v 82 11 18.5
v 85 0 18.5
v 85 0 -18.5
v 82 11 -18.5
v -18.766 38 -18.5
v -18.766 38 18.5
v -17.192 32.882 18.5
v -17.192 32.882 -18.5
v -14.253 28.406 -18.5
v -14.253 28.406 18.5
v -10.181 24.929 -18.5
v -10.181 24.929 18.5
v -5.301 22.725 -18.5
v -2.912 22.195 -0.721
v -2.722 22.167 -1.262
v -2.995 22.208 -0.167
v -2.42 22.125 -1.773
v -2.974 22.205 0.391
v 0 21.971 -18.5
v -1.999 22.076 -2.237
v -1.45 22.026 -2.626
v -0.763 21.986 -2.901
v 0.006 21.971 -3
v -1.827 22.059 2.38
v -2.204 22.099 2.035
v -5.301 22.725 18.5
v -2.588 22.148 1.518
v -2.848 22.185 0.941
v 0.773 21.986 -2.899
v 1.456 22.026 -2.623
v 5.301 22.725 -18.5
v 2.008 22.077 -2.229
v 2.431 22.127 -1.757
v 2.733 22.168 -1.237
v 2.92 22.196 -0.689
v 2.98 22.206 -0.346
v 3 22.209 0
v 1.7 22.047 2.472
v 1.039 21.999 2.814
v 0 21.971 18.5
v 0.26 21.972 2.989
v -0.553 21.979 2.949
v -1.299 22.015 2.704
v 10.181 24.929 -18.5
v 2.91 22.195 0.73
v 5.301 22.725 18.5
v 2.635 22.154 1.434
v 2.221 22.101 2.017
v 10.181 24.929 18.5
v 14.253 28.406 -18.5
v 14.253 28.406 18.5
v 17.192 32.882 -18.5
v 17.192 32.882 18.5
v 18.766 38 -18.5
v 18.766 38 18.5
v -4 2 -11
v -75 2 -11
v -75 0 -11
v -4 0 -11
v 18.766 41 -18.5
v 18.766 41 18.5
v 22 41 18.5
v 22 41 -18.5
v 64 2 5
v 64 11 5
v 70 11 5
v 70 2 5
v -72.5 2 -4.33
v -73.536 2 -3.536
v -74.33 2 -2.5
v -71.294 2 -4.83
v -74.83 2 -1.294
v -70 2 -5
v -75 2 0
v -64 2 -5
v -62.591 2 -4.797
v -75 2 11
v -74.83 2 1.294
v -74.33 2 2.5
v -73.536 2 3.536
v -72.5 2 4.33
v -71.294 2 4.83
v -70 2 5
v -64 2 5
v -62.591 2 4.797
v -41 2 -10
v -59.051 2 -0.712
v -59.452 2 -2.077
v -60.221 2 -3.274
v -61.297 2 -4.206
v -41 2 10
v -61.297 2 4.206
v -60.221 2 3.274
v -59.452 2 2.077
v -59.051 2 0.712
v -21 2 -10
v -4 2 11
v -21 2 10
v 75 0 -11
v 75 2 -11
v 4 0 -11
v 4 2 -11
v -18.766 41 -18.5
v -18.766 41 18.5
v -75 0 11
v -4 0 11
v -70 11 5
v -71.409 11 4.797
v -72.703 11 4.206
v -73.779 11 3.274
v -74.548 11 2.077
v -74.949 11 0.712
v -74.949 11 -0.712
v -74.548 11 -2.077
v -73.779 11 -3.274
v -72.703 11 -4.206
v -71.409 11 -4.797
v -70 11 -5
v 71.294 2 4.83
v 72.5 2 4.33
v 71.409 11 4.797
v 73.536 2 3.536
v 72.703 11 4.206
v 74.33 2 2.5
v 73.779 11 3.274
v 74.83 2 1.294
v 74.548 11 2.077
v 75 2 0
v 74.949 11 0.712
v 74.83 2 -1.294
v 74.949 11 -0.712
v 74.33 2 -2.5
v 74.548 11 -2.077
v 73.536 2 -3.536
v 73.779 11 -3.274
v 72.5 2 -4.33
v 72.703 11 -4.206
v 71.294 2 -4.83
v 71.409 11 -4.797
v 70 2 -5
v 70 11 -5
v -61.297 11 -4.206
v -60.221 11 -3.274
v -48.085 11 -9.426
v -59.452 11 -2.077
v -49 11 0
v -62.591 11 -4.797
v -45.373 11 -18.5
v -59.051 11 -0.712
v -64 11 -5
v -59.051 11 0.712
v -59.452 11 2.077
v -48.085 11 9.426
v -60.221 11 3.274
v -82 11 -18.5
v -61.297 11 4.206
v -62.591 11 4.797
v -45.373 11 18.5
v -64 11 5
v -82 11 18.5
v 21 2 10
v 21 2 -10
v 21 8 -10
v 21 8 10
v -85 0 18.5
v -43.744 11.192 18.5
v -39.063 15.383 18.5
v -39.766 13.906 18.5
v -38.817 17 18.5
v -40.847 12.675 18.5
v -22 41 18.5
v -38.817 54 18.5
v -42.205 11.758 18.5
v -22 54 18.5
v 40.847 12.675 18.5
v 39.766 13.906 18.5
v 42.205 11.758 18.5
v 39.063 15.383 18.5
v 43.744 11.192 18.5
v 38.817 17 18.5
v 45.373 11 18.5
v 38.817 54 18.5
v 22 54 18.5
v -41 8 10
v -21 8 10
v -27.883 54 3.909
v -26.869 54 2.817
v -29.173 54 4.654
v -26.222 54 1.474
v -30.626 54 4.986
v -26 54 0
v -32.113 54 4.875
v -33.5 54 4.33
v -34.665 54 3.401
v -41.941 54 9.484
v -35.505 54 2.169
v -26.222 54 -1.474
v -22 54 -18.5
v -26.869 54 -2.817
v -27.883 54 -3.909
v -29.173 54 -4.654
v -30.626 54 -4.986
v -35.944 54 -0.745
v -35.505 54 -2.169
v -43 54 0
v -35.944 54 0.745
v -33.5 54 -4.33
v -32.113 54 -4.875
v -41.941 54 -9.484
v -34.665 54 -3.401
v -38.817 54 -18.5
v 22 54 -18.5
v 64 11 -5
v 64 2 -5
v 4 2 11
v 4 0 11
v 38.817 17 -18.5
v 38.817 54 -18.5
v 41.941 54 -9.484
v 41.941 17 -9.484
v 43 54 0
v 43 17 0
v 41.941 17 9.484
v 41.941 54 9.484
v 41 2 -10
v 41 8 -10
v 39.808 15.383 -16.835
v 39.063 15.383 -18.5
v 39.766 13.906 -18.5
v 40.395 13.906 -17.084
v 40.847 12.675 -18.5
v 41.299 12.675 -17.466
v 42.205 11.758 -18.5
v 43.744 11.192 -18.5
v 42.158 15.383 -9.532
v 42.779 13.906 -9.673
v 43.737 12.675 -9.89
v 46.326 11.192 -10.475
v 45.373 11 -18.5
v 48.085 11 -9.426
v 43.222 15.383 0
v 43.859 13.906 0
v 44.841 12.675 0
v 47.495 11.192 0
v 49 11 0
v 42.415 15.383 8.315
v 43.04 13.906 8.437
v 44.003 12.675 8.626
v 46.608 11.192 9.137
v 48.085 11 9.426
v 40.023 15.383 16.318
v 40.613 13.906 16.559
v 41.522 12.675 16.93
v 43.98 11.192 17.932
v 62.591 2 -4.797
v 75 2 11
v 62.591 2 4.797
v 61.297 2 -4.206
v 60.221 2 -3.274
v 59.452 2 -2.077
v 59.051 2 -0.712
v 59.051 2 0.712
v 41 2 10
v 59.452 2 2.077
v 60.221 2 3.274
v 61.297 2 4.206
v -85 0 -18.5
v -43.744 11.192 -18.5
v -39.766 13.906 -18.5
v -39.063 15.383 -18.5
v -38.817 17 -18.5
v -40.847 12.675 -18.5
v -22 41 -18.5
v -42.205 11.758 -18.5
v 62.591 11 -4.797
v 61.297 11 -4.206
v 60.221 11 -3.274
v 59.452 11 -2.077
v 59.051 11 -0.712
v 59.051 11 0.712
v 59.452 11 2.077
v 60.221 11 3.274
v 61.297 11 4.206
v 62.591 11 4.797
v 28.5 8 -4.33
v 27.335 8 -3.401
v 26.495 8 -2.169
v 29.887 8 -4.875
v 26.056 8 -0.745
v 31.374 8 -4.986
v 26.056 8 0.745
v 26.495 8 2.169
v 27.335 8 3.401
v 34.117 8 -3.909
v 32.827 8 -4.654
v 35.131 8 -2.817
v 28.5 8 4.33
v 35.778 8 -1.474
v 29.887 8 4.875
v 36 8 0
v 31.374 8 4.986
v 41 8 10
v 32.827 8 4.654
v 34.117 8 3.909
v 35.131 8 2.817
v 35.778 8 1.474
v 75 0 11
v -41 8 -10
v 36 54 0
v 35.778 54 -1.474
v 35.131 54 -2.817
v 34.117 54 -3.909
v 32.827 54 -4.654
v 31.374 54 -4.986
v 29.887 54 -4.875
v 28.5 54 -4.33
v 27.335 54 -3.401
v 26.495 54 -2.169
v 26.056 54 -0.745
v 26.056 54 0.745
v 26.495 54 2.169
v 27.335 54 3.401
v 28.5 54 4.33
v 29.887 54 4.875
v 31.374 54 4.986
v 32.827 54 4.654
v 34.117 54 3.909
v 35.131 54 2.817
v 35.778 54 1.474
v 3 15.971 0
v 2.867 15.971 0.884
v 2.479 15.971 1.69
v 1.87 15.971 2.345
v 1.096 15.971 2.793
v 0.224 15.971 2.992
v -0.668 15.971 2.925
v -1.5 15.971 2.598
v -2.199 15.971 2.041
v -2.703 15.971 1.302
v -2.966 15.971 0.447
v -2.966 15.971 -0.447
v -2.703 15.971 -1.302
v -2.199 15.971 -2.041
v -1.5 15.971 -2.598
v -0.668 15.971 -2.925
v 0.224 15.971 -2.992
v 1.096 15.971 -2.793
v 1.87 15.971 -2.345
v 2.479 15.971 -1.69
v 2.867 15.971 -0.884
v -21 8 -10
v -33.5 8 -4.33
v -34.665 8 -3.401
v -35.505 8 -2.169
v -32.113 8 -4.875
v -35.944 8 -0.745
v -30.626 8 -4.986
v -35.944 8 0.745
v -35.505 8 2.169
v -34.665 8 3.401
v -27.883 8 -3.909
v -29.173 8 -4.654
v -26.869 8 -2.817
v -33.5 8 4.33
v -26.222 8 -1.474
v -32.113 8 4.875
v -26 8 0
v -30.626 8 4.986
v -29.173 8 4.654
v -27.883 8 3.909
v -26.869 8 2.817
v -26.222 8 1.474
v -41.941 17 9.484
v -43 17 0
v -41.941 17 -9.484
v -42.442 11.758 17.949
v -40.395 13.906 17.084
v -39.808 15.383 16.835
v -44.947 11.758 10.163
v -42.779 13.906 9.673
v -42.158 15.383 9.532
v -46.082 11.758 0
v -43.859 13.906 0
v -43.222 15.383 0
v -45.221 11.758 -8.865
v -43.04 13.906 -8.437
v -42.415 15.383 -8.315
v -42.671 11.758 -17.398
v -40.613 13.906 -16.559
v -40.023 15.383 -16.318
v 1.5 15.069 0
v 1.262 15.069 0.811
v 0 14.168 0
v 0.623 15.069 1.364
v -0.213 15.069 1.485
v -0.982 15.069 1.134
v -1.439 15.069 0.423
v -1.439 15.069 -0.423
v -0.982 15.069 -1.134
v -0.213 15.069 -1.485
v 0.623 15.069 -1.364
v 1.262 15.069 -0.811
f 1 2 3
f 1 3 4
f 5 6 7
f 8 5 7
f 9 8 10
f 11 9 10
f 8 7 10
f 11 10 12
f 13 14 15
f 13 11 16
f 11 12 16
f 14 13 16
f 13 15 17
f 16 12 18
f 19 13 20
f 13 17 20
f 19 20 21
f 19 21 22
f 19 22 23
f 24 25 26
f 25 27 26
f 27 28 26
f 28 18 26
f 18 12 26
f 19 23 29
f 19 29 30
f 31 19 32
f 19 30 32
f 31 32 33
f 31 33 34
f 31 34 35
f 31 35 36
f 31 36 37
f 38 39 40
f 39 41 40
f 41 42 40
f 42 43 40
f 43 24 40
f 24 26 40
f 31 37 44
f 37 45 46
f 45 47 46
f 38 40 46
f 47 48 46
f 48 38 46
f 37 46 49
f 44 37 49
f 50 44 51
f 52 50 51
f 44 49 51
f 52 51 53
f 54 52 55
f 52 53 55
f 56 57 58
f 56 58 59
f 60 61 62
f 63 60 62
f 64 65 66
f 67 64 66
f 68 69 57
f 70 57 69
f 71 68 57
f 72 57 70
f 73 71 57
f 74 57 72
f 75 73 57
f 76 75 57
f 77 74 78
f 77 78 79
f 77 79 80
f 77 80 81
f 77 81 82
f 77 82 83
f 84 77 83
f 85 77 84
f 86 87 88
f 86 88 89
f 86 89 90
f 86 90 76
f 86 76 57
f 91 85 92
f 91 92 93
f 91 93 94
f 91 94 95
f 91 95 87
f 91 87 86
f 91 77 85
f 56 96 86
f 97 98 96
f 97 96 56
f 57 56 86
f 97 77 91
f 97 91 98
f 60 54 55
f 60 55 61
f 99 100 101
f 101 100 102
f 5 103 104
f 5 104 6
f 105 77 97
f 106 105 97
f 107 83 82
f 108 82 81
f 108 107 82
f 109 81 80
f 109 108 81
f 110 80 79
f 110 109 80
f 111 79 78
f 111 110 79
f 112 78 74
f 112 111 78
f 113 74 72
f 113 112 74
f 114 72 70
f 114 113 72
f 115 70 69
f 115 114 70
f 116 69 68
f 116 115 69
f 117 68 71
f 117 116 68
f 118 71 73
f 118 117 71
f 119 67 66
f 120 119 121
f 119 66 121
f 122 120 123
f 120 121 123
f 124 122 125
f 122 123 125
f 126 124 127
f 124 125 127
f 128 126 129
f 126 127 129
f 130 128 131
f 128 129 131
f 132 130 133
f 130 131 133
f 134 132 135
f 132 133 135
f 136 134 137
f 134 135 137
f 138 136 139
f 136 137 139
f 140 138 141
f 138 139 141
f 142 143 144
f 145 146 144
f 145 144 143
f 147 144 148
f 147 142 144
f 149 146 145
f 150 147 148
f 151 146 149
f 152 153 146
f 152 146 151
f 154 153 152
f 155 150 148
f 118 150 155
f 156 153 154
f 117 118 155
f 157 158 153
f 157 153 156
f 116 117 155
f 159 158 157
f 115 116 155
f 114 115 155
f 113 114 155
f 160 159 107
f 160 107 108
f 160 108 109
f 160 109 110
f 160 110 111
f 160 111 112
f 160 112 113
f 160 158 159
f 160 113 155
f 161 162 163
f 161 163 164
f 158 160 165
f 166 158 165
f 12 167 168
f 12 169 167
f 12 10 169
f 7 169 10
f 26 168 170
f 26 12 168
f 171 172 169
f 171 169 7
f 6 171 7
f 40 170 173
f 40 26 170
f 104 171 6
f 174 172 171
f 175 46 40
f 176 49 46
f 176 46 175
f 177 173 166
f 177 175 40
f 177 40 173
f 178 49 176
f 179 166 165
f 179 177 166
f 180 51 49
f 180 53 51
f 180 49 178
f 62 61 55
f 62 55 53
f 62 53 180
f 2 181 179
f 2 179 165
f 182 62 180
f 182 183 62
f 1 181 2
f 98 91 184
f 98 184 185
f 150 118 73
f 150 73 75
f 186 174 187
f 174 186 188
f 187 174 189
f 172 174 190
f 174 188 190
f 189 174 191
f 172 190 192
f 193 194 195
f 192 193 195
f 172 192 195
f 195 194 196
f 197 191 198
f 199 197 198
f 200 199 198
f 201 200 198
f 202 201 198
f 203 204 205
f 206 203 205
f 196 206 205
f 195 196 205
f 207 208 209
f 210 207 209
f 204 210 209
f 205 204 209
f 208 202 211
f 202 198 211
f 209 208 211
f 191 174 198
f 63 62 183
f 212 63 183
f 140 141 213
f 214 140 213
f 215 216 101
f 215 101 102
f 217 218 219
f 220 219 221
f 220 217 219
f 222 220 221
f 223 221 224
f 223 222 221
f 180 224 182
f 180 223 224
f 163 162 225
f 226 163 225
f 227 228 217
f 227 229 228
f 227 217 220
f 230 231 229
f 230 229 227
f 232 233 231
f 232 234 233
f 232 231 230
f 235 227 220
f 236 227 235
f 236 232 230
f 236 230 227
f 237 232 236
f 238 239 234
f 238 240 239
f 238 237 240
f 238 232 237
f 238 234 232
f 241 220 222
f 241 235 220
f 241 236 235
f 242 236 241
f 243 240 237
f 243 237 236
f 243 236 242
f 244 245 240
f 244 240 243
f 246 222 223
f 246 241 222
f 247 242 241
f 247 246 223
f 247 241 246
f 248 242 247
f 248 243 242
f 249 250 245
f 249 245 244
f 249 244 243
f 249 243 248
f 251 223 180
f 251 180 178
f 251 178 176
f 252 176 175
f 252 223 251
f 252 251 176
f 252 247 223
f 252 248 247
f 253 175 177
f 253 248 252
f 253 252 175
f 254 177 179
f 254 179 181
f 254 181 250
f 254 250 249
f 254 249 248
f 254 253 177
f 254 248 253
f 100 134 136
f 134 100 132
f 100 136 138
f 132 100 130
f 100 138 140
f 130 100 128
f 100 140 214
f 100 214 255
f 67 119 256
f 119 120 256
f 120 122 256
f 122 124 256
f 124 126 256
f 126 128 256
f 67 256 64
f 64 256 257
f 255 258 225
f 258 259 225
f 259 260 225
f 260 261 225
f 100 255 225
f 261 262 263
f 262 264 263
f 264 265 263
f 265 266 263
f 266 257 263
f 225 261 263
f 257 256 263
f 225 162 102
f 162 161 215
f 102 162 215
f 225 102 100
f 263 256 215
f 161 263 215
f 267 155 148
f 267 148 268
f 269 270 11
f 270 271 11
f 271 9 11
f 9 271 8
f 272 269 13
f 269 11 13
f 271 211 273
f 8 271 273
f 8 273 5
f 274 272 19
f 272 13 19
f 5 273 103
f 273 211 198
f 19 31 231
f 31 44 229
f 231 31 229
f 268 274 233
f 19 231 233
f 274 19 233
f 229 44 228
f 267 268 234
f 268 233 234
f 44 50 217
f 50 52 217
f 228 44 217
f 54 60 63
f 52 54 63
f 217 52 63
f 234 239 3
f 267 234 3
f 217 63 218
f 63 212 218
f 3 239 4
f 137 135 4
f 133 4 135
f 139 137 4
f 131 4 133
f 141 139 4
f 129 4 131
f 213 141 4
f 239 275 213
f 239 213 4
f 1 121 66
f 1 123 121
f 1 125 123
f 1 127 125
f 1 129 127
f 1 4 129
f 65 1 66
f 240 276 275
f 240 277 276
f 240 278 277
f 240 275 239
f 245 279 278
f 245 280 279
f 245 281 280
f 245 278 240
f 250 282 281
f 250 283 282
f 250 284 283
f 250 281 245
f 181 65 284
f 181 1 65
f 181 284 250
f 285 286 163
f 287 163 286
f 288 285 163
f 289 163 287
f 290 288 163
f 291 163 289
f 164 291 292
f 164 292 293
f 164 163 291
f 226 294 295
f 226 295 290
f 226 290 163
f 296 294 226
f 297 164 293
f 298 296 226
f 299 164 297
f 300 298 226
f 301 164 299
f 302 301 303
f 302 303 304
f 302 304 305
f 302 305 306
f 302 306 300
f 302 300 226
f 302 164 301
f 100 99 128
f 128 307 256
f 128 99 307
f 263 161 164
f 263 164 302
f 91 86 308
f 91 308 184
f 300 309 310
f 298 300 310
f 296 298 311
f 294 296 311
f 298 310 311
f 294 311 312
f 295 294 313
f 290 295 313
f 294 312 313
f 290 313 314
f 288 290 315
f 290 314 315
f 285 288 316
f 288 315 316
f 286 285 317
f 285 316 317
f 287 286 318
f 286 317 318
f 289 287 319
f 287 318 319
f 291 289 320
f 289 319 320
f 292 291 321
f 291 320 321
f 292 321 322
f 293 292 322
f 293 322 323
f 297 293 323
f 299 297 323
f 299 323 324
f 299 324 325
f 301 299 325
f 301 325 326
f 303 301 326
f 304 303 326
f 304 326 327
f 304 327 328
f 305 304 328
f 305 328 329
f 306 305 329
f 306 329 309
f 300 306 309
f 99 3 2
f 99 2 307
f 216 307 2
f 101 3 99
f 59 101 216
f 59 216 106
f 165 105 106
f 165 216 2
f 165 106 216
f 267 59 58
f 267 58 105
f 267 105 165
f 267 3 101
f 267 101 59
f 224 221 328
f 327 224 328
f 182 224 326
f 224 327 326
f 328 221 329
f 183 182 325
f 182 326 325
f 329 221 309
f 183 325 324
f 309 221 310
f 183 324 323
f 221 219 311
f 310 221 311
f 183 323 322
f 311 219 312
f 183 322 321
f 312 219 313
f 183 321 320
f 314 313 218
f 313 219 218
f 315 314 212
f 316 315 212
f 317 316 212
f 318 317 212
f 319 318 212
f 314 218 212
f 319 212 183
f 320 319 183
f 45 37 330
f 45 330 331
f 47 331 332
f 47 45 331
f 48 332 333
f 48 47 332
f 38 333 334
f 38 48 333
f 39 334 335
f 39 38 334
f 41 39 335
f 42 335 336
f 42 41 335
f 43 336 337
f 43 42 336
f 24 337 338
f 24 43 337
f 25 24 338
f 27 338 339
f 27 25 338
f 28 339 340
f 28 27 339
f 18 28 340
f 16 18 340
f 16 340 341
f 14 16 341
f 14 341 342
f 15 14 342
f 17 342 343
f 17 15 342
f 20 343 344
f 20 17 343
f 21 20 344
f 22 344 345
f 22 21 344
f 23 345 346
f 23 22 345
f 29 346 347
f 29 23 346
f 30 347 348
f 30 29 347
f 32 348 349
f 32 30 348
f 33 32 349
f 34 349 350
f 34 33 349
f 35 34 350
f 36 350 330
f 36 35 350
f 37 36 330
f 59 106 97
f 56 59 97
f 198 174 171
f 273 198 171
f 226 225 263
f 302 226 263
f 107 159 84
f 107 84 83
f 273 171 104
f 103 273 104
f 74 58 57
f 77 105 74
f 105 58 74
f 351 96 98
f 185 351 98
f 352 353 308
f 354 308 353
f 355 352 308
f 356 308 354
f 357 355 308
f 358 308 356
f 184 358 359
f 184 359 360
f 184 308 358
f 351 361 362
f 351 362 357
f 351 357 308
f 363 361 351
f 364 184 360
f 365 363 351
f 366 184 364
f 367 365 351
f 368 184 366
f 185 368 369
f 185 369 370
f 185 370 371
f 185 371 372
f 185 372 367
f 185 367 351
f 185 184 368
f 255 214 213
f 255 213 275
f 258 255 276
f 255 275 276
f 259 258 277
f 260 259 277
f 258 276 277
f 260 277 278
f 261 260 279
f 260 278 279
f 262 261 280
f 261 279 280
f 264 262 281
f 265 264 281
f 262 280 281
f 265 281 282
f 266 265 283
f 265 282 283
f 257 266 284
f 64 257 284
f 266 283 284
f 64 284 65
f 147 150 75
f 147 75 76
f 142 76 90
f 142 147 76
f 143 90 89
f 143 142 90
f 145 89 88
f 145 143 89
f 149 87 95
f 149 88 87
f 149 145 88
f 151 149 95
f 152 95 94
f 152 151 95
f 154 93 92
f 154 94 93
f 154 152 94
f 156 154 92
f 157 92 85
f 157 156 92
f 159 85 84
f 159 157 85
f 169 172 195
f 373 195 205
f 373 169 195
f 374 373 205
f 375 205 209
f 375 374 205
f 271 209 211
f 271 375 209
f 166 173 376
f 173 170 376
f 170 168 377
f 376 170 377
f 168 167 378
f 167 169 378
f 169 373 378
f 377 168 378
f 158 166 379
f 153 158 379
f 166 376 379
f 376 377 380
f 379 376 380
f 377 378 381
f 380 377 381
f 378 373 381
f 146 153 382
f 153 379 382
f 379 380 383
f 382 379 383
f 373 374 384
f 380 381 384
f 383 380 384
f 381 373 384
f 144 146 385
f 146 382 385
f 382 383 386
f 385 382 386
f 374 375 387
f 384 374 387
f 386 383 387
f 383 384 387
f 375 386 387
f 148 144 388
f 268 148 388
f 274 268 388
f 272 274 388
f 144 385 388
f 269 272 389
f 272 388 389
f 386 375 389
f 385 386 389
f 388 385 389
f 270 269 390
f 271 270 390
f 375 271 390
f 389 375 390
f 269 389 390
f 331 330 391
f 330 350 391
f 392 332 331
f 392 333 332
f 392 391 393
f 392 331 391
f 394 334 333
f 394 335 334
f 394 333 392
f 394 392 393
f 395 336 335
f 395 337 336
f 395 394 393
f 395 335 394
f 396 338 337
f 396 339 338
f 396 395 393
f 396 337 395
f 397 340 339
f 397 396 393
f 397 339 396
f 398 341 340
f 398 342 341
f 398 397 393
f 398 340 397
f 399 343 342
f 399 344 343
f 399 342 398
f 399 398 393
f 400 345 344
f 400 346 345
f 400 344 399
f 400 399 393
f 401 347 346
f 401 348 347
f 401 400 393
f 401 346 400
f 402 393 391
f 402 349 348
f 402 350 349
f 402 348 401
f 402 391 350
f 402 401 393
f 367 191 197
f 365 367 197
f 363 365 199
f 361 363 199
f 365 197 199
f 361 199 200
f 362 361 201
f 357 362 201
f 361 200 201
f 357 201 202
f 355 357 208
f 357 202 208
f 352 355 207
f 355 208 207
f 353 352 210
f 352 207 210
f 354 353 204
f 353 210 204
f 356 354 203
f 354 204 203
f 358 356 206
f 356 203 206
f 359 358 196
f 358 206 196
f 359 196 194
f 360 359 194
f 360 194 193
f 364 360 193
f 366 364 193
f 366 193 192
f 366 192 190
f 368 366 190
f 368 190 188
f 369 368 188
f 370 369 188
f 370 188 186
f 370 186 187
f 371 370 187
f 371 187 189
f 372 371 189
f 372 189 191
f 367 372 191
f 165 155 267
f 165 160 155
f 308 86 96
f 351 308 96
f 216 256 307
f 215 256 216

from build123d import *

# Parameters (mm, degrees)
BOSS_EXTRUDE1_DEPTH = 18.5
BOSS_EXTRUDE2_START = -11
BOSS_EXTRUDE2_DEPTH = 54
CUT_EXTRUDE1_DEPTH  = 27
SKETCH4_R           = 5
CUT_EXTRUDE2_DEPTH  = 55
SKETCH5_W           = 20
SKETCH5_H           = 20
CUT_EXTRUDE3_DEPTH  = 8
SKETCH6_W           = 71
SKETCH6_H           = 2
CUT_EXTRUDE4_DEPTH  = 11
CUT_EXTRUDE5_DEPTH  = 12
FILLET1_R           = 6


with BuildPart() as part:
    # Sketch1 → Boss-Extrude1 (new body, symmetric)
    with BuildSketch(Plane.XY):
        Polygon((-85, 0), (85, 0), (82, 11), (-82, 11), align=None)
    extrude(amount=BOSS_EXTRUDE1_DEPTH, both=True)

    # Sketch2 → Boss-Extrude2 (add)
    with BuildSketch(Plane(origin=(0, 11, 0), x_dir=(1, 0, 0), z_dir=(0, 1, 0)).offset(BOSS_EXTRUDE2_START)):
        with BuildLine():
            Line((38.816877772, -18.5), (-38.816877772, -18.5))
            ThreePointArc((-38.816877772, -18.5), (-43, 0), (-38.816877772, 18.5))
            Line((-38.816877772, 18.5), (38.816877772, 18.5))
            ThreePointArc((38.816877772, 18.5), (43, 0), (38.816877772, -18.5))
        make_face()
    extrude(amount=BOSS_EXTRUDE2_DEPTH)

    # Sketch3 → Cut-Extrude1 (cut, symmetric)
    with BuildSketch(Plane.XY):
        with BuildLine():
            Line((-22, 54), (-22, 41))
            Line((-22, 41), (-18.766334066, 41))
            Line((-18.766334066, 41), (-18.766334066, 38))
            ThreePointArc((-18.766334066, 38), (0, 21.970640627), (18.766334066, 38))
            Line((18.766334066, 38), (18.766334066, 41))
            Line((18.766334066, 41), (22, 41))
            Line((22, 41), (22, 54))
            Line((22, 54), (-22, 54))
        make_face()
    extrude(amount=CUT_EXTRUDE1_DEPTH, both=True, mode=Mode.SUBTRACT)

    # Sketch4 → Cut-Extrude2 (cut, through all)
    with BuildSketch(Plane(origin=(0, 54, 0), x_dir=(1, 0, 0), z_dir=(0, 1, 0))):
        with Locations((-31, 0)):
            Circle(SKETCH4_R)
        with Locations((31, 0)):
            Circle(SKETCH4_R)
    extrude(amount=-CUT_EXTRUDE2_DEPTH, mode=Mode.SUBTRACT)

    # Sketch5 → Cut-Extrude3 (cut)
    with BuildSketch(Plane.XZ):
        with Locations((-31, 0)):
            Rectangle(SKETCH5_W, SKETCH5_H)
        with Locations((31, 0)):
            Rectangle(SKETCH5_W, SKETCH5_H)
    extrude(amount=-CUT_EXTRUDE3_DEPTH, mode=Mode.SUBTRACT)

    # Sketch6 → Cut-Extrude4 (cut, symmetric)
    with BuildSketch(Plane.XY):
        with Locations((-39.5, 1)):
            Rectangle(SKETCH6_W, SKETCH6_H)
    cut_extrude4 = extrude(amount=CUT_EXTRUDE4_DEPTH, both=True, mode=Mode.SUBTRACT)

    # Mirror1: Cut-Extrude4 across plane
    add(cut_extrude4.mirror(Plane(origin=(0, 0, 0), x_dir=(0, 0, 1), z_dir=(1, 0, 0))), mode=Mode.SUBTRACT)

    # Sketch7 → Cut-Extrude5 (cut, through all)
    with BuildSketch(Plane(origin=(0, 11, 0), x_dir=(1, 0, 0), z_dir=(0, 1, 0))):
        with BuildLine():
            Line((-64, -5), (-70, -5))
            ThreePointArc((-70, -5), (-75, 0), (-70, 5))
            Line((-70, 5), (-64, 5))
            ThreePointArc((-64, 5), (-59, 0), (-64, -5))
        make_face()
        with BuildLine():
            Line((64, -5), (70, -5))
            ThreePointArc((70, -5), (75, 0), (70, 5))
            Line((70, 5), (64, 5))
            ThreePointArc((64, 5), (59, 0), (64, -5))
        make_face()
    extrude(amount=-CUT_EXTRUDE5_DEPTH, mode=Mode.SUBTRACT)

    # Sketch8 → Cut-Revolve1 (revolve, cut)
    with BuildSketch(Plane.XY):
        Polygon((0, 21.970640627), (0, 14.16805877), (3, 15.970640627), (3, 25.476225131), (0, 25.476225131), align=None)
    revolve(axis=Axis((0, 21.970640627, 0), (0, -1, 0)), mode=Mode.SUBTRACT)

    # Fillet1
    fillet1_edges = [part.edges().sort_by_distance(p)[0] for p in [
        (-43, 11, 0),
        (43, 11, 0),
    ]]
    fillet(fillet1_edges, radius=FILLET1_R)


solid = part.part
